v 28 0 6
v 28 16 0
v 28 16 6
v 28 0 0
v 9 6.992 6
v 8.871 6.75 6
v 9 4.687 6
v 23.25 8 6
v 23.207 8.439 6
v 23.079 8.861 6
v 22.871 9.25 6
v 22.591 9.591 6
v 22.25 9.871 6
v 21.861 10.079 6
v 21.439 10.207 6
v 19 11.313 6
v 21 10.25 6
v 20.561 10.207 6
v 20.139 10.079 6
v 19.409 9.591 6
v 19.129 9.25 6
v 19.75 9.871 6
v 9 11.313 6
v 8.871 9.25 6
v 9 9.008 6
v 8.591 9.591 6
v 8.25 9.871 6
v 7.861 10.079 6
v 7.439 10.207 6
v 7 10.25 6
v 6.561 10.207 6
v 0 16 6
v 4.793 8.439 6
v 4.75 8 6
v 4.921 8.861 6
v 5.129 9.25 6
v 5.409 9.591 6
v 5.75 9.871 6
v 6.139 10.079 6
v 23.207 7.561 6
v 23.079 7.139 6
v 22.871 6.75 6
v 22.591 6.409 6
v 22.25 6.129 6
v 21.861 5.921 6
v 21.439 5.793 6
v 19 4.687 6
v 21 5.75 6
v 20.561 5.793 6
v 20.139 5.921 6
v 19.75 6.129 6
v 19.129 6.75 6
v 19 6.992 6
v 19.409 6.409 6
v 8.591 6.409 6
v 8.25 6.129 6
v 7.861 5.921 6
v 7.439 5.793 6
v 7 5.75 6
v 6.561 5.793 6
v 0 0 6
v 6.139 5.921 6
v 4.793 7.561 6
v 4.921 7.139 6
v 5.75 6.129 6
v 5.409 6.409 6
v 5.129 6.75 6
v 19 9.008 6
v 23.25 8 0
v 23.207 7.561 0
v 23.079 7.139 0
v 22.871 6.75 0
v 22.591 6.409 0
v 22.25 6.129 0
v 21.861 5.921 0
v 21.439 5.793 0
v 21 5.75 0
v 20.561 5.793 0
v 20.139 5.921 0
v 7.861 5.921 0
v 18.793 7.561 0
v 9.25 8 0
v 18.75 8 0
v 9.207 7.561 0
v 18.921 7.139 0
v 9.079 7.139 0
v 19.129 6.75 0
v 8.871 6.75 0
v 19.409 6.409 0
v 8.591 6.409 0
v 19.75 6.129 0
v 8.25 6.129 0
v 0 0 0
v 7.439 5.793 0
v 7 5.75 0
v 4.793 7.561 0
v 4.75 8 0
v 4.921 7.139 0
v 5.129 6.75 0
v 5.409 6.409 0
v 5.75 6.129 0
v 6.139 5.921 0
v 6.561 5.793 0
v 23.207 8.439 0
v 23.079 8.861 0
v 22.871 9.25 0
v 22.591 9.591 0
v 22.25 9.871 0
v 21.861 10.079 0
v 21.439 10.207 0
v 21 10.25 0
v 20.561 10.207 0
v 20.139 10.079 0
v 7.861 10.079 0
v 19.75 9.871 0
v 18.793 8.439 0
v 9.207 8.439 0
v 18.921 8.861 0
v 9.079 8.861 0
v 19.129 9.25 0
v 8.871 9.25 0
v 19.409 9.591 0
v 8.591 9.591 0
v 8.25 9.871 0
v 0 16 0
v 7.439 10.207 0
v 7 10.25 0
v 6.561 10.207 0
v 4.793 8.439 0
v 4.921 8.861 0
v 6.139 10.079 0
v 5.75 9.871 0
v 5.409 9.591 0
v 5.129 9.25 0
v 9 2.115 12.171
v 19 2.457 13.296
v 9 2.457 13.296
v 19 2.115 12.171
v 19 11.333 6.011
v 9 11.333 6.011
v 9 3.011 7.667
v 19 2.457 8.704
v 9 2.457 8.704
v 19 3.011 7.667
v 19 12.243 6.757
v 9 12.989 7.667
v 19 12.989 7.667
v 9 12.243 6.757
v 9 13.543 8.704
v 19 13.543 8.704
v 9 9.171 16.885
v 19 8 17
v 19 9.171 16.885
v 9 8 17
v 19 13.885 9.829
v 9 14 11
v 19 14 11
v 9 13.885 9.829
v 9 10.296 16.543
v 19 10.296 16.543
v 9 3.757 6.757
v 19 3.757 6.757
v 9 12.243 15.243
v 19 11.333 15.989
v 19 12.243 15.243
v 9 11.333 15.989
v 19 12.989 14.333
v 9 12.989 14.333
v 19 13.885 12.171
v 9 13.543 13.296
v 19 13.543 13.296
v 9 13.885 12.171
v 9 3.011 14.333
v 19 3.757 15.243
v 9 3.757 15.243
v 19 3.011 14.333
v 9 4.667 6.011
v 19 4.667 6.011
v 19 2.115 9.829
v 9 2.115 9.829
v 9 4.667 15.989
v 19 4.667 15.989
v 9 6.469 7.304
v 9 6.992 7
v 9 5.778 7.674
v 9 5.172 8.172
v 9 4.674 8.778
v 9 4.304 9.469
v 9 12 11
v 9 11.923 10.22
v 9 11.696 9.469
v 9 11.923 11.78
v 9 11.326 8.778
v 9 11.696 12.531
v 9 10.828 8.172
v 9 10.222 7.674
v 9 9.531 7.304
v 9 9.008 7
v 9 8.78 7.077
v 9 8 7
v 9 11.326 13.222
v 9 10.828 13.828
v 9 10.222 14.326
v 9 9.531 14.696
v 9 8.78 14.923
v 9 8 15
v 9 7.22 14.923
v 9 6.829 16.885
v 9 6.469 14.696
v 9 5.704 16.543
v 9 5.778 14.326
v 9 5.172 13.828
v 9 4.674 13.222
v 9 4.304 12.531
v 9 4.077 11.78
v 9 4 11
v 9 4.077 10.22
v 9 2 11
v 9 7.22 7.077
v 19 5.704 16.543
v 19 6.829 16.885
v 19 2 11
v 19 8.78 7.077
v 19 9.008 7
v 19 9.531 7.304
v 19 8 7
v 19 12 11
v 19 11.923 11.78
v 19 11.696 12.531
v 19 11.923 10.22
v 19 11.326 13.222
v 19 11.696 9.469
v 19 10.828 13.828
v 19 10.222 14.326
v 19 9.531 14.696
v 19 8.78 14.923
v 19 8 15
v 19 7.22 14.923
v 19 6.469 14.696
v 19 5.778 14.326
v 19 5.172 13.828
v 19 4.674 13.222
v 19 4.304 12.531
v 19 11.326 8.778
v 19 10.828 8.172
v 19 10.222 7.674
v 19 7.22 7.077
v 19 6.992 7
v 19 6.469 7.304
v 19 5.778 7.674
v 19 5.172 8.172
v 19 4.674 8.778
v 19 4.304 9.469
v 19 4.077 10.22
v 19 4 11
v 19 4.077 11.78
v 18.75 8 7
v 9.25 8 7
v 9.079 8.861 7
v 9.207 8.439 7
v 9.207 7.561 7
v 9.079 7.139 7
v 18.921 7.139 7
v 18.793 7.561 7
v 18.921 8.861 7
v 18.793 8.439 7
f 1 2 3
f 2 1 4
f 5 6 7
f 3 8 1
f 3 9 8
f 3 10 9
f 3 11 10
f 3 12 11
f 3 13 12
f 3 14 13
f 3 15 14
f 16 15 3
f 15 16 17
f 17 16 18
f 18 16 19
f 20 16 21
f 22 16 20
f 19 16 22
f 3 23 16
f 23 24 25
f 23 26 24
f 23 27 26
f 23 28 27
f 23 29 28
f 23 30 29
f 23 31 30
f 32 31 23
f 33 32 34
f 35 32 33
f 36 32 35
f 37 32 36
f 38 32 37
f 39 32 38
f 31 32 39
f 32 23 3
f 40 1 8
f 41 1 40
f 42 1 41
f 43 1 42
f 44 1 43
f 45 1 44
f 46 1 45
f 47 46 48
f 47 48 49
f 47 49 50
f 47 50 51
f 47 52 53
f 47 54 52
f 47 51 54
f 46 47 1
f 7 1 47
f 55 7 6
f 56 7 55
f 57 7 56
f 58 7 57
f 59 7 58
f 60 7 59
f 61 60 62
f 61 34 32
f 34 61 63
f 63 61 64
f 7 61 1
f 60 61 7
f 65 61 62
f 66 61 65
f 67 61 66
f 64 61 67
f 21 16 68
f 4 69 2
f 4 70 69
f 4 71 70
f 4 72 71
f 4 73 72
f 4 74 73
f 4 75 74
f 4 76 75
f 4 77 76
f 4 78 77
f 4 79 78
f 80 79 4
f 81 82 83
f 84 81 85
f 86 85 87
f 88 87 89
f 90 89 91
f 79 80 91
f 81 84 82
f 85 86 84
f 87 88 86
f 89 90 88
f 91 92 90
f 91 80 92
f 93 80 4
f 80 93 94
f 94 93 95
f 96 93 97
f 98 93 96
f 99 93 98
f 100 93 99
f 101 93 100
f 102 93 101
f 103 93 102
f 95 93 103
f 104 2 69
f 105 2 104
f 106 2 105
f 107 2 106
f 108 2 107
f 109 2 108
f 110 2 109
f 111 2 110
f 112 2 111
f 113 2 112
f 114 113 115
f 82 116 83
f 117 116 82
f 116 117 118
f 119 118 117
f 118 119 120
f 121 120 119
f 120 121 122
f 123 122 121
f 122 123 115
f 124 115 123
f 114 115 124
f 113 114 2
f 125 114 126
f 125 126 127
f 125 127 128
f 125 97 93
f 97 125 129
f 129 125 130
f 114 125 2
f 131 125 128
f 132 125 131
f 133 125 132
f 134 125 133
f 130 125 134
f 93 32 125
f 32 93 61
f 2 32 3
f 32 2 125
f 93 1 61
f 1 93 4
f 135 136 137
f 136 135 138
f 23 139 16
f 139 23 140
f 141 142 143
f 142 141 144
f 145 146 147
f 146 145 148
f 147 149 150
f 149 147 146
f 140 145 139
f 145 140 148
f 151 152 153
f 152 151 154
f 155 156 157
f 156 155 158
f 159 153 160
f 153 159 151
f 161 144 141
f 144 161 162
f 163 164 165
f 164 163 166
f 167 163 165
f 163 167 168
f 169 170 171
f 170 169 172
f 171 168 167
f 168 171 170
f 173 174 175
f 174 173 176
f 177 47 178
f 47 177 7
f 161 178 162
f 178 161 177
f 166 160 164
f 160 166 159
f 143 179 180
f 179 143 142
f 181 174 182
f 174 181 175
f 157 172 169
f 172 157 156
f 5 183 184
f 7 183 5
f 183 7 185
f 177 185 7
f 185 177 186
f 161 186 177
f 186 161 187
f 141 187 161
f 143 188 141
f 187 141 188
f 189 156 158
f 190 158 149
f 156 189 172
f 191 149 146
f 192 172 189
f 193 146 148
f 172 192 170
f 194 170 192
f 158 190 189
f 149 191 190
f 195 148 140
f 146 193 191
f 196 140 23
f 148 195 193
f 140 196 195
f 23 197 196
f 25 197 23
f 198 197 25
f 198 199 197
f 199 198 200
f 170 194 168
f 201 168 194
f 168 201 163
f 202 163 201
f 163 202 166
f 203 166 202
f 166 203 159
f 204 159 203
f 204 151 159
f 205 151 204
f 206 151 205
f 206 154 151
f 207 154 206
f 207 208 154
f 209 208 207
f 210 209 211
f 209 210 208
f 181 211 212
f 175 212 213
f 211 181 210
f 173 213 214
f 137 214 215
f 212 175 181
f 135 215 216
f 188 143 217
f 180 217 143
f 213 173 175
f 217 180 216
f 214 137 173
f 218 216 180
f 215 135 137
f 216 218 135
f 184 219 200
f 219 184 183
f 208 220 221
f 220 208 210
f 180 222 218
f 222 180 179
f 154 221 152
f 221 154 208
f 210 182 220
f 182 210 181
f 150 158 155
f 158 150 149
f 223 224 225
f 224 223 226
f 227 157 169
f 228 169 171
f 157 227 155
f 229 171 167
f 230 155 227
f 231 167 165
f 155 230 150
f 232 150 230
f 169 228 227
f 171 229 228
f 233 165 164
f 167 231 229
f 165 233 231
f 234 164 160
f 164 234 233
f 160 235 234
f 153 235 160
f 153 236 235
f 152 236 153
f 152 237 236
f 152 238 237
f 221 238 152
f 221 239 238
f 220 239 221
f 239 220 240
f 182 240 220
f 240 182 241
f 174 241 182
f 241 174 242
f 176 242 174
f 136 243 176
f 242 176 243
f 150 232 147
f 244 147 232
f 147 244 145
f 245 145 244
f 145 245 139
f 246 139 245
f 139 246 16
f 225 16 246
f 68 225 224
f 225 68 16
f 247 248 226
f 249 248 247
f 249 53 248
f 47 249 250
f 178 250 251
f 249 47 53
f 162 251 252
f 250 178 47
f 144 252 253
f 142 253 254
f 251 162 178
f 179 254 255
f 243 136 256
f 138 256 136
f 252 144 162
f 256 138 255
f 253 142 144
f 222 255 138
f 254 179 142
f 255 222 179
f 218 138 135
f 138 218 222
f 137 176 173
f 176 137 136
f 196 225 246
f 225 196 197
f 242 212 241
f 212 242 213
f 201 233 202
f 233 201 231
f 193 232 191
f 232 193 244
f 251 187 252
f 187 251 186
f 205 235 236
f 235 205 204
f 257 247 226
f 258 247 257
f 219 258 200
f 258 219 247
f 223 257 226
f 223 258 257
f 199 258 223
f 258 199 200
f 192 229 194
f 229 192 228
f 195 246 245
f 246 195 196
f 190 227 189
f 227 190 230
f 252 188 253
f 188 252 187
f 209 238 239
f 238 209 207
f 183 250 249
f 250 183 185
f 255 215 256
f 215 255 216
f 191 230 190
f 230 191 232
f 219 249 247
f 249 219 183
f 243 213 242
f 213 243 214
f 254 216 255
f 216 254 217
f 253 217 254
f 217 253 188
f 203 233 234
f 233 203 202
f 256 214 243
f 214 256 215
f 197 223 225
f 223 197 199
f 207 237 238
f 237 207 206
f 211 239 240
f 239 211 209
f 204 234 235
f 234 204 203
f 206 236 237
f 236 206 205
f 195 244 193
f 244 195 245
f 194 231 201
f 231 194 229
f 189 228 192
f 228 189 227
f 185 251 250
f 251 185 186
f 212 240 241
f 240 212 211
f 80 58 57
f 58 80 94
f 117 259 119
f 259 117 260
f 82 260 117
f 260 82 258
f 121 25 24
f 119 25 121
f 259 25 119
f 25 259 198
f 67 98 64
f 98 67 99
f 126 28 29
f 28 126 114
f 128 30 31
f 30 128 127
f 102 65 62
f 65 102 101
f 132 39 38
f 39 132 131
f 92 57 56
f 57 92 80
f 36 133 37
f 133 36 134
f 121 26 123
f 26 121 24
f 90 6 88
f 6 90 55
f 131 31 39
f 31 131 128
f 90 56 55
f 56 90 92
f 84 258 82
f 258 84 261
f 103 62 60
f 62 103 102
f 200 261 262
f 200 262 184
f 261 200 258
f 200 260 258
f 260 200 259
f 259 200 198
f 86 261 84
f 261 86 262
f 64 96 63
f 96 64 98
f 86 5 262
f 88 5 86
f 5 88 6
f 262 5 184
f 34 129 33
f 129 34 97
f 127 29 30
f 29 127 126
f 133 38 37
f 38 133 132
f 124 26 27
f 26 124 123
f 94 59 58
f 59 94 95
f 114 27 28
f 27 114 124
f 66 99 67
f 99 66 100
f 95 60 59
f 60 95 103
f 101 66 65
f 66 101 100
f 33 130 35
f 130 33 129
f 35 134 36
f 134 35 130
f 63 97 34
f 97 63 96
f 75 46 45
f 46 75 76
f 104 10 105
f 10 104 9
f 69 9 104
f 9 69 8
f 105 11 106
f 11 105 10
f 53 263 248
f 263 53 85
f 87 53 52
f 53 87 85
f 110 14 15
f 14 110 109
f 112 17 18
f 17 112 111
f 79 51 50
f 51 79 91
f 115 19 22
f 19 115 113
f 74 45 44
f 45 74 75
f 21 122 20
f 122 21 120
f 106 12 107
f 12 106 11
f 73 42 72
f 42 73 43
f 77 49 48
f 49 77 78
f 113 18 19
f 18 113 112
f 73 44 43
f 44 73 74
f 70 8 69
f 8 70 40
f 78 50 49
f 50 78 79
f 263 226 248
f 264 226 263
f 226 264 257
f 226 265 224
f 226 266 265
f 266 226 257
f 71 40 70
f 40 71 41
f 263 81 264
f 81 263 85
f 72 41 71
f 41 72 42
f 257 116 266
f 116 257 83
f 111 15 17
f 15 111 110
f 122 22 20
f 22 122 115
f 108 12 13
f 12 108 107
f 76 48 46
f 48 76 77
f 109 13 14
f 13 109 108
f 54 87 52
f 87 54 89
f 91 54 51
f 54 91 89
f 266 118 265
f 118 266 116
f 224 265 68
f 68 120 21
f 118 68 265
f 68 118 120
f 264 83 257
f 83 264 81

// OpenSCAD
$fn = 32;

// ----------------------------------------------------------------------
// Cable clip: cable 8 mm, clamp 12 mm, base 28 mm
// ----------------------------------------------------------------------

// --- parameters (mm) ---
base_w = 28;              // base length, X
base_d = 16;              // base width, Y
base_t = 6;               // base thickness
clamp_d = 12;             // clamp outside diameter
wall_t = 2;               // clamp wall
cable_d = 8;              // cable opening
ring_w = 10;              // clamp width along the cable
screw_d = 4.5;            // screw clearance
sink = 1;                 // overlap of the clamp into the base

module base() {
  cube([base_w, base_d, base_t]);
}

module clamp() {
  translate([base_w / 2, base_d / 2, base_t + clamp_d / 2 - sink]) rotate([0, 90, 0])
    cylinder(h = ring_w, d = clamp_d, center = true);
}

difference() {
  union() {
    base();
    clamp();
  }
  translate([base_w / 2, base_d / 2, base_t + clamp_d / 2 - sink]) rotate([0, 90, 0]) translate([0, 0, -ring_w / 2 - 1]) cylinder(h = ring_w + 2, d = cable_d);
  translate([7, base_d / 2, -1]) cylinder(h = base_t + 2, d = screw_d);
  translate([21, base_d / 2, -1]) cylinder(h = base_t + 2, d = screw_d);
}
